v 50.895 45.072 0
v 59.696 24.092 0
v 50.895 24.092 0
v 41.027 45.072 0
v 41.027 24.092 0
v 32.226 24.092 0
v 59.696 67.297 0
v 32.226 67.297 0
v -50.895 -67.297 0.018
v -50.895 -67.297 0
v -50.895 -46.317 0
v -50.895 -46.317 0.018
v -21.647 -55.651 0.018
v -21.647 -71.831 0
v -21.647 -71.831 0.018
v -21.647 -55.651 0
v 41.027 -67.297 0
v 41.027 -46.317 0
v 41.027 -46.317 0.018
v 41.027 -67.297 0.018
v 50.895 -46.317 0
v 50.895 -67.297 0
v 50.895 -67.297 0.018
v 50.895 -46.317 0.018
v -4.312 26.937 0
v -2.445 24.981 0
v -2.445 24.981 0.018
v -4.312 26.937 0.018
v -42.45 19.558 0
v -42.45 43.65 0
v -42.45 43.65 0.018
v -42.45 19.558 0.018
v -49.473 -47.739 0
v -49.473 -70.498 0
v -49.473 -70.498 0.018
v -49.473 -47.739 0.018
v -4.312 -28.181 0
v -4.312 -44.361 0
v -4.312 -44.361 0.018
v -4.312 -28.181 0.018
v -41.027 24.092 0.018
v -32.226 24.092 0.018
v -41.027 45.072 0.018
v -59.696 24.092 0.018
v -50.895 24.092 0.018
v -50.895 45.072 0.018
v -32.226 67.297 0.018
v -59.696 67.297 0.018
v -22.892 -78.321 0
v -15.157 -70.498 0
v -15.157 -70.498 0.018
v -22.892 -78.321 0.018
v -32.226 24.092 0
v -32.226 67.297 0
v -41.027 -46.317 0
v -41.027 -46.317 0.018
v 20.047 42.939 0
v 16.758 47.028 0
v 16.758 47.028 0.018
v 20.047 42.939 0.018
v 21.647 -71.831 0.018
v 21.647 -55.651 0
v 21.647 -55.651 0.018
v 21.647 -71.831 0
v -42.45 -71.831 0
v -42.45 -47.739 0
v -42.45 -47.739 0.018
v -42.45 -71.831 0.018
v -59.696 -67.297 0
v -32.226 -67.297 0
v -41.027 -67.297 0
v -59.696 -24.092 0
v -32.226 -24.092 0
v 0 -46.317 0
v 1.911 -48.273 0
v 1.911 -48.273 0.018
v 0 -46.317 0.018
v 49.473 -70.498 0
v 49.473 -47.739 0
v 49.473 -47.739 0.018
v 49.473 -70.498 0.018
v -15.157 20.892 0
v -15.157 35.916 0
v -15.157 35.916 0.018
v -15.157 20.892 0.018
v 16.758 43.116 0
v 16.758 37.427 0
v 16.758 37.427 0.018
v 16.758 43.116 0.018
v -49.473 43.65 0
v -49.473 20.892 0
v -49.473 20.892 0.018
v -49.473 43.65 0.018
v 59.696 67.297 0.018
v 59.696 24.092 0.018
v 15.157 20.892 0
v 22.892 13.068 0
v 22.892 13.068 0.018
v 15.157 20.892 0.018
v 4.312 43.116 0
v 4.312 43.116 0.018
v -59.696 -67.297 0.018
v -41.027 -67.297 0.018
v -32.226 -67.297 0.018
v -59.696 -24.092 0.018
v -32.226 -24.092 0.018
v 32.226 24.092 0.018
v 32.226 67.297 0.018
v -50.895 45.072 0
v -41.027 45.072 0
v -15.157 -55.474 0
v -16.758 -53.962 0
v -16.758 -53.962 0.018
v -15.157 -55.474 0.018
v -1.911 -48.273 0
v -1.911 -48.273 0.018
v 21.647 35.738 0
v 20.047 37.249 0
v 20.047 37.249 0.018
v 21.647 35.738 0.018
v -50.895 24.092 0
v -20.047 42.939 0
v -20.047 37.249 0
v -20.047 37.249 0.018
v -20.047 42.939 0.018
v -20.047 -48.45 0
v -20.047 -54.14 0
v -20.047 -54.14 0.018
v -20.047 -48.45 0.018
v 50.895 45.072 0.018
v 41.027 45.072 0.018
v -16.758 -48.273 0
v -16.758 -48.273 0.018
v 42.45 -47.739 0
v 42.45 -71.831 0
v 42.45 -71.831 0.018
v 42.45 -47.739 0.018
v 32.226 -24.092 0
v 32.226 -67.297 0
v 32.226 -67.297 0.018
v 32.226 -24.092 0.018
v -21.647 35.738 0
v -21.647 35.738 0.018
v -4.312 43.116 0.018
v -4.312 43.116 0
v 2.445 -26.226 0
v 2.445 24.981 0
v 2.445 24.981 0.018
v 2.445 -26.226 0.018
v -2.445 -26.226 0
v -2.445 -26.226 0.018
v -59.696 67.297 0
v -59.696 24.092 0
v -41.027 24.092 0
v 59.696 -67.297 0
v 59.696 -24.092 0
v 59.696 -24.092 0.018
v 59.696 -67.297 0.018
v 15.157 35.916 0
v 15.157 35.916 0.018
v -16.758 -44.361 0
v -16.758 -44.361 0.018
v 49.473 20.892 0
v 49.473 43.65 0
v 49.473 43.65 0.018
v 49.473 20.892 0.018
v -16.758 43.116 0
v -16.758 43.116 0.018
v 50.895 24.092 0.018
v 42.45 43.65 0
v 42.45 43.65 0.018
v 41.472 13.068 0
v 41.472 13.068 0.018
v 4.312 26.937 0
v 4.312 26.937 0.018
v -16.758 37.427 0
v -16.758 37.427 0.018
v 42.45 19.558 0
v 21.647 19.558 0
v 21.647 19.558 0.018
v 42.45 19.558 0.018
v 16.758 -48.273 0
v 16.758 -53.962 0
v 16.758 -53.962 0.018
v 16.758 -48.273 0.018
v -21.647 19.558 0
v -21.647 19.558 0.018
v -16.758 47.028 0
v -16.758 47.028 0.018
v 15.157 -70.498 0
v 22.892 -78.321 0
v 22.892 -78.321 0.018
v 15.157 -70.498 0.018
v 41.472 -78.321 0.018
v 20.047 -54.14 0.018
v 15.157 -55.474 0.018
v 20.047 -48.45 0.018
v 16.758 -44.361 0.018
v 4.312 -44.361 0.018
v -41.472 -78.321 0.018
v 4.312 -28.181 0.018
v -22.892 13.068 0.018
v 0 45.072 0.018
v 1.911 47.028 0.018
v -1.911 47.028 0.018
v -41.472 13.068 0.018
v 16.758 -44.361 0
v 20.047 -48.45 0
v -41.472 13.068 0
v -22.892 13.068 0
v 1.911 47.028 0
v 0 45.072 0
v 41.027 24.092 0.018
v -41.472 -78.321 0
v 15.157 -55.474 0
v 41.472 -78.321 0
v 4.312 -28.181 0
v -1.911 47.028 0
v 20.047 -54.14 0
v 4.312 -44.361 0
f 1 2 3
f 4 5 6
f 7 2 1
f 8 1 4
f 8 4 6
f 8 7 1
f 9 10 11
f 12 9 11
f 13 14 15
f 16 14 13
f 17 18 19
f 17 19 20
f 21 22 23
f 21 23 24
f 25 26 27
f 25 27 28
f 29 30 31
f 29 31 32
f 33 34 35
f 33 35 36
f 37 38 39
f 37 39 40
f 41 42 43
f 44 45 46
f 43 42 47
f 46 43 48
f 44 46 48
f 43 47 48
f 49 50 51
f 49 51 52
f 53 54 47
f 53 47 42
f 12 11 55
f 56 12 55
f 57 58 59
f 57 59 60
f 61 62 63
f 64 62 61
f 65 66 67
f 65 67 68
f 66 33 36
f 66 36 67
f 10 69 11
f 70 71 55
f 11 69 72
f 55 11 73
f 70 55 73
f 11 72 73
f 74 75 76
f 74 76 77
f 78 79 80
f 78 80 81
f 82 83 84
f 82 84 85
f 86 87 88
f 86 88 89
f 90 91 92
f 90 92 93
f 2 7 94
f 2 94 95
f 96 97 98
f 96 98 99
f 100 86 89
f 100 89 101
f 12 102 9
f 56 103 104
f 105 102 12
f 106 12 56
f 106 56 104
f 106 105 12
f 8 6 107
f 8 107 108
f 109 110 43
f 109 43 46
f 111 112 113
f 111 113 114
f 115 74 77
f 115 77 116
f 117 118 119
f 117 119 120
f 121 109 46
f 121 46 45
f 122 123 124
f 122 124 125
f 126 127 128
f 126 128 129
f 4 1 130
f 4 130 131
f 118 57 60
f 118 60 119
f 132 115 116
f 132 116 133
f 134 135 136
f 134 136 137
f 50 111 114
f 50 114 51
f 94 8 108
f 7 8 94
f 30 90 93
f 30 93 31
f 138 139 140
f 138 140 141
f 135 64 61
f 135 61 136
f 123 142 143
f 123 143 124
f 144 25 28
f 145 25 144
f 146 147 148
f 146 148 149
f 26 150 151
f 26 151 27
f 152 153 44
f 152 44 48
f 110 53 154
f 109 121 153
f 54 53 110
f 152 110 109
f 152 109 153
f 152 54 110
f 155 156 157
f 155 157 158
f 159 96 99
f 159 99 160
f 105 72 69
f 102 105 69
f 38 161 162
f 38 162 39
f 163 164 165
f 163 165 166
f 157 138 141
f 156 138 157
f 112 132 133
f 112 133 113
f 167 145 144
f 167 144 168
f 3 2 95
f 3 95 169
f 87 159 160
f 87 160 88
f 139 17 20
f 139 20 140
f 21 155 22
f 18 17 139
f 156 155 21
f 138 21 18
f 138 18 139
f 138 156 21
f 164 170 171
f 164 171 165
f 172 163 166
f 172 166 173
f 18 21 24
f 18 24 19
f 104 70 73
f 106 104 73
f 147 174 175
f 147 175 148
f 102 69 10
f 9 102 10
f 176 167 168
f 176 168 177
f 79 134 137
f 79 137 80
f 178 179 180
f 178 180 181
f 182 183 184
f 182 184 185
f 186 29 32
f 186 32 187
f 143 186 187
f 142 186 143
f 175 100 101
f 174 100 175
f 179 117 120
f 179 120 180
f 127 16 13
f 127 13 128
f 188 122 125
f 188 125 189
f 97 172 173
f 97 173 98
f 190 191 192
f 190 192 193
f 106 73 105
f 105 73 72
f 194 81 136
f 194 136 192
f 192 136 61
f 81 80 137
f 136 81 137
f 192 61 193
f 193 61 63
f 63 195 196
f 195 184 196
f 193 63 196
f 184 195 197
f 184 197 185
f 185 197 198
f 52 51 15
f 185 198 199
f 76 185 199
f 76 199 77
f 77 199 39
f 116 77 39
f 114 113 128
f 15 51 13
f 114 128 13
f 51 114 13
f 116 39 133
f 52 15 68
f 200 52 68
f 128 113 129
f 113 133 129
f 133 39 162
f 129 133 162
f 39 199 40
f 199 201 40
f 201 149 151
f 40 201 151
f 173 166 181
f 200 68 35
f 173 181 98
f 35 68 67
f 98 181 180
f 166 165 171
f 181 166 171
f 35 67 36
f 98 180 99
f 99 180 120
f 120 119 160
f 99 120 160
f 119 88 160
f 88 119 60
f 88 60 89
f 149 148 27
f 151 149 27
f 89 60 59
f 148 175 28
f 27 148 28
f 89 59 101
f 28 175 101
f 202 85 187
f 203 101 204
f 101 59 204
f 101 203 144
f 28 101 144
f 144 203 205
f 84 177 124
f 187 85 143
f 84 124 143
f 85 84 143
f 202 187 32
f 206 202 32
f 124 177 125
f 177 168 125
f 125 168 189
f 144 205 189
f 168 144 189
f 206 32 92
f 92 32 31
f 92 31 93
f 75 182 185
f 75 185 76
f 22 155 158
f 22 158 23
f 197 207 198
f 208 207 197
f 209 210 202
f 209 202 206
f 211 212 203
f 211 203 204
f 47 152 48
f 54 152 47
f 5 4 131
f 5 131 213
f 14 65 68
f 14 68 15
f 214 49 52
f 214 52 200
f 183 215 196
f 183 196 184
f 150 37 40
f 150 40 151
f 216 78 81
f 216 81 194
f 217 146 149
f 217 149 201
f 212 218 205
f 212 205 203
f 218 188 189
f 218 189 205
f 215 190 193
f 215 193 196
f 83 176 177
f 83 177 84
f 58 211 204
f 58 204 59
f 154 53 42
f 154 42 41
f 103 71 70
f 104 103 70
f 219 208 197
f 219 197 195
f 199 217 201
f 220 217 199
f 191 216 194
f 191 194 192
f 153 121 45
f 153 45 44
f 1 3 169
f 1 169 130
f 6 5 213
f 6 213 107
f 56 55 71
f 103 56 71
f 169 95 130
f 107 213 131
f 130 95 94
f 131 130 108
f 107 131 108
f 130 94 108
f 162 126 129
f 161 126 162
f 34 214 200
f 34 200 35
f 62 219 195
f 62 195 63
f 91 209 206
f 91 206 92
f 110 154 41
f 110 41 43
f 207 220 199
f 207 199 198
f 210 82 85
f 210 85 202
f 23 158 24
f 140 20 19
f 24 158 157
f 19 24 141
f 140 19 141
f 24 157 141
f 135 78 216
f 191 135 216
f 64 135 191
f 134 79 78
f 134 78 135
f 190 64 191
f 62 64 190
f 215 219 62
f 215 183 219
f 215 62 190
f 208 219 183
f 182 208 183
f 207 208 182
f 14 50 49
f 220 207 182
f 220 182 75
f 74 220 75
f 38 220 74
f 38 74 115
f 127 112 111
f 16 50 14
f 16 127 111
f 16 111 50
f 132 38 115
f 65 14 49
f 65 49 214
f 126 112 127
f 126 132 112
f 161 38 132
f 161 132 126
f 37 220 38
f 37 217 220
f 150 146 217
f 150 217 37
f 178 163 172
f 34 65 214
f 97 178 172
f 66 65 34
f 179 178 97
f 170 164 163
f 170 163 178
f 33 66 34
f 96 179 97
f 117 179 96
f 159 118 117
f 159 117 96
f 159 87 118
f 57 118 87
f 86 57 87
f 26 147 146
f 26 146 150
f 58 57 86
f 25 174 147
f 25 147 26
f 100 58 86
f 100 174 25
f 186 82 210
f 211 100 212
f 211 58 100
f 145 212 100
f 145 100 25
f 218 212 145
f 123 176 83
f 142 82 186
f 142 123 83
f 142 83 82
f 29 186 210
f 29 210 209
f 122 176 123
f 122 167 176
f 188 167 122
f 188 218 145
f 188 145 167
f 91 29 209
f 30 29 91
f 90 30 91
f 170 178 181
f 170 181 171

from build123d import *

# Parameters (mm, degrees)
FEED_DEPTH    = 0.018
PATCH_DEPTH   = 0.018
PATCH_2_DEPTH = 0.018
PATCH_3_DEPTH = 0.018
PATCH_4_DEPTH = 0.018


with BuildPart() as part:
    # Feed1 → Feed (new body)
    with BuildSketch(Plane.XY):
        Polygon((-49.47285, 43.6499), (-42.44975, 43.6499), (-42.44975, 19.558), (-21.64715, 19.558), (-21.64715, 35.7378), (-20.04695, 37.2491), (-20.04695, 42.9387), (-16.75765, 47.0281), (-1.91135, 47.0281), (0, 45.0723), (1.91135, 47.0281), (16.75765, 47.0281), (20.04695, 42.9387), (20.04695, 37.2491), (21.64715, 35.7378), (21.64715, 19.558), (42.44975, 19.558), (42.44975, 43.6499), (49.47285, 43.6499), (49.47285, 20.8915), (41.47185, 13.0683), (22.89175, 13.0683), (15.15745, 20.8915), (15.15745, 35.9156), (16.75765, 37.4269), (16.75765, 43.1165), (4.31165, 43.1165), (4.31165, 26.9367), (2.44475, 24.9809), (2.44475, -26.2255), (4.31165, -28.1813), (4.31165, -44.3611), (16.75765, -44.3611), (20.04695, -48.4505), (20.04695, -54.1401), (21.64715, -55.6514), (21.64715, -71.8312), (42.44975, -71.8312), (42.44975, -47.7393), (49.47285, -47.7393), (49.47285, -70.4977), (41.47185, -78.3209), (22.89175, -78.3209), (15.15745, -70.4977), (15.15745, -55.4736), (16.75765, -53.9623), (16.75765, -48.2727), (1.91135, -48.2727), (0, -46.3169), (-1.91135, -48.2727), (-16.75765, -48.2727), (-16.75765, -53.9623), (-15.15745, -55.4736), (-15.15745, -70.4977), (-22.89175, -78.3209), (-41.47185, -78.3209), (-49.47285, -70.4977), (-49.47285, -47.7393), (-42.44975, -47.7393), (-42.44975, -71.8312), (-21.64715, -71.8312), (-21.64715, -55.6514), (-20.04695, -54.1401), (-20.04695, -48.4505), (-16.75765, -44.3611), (-4.31165, -44.3611), (-4.31165, -28.1813), (-2.44475, -26.2255), (-2.44475, 24.9809), (-4.31165, 26.9367), (-4.31165, 43.1165), (-16.75765, 43.1165), (-16.75765, 37.4269), (-15.15745, 35.9156), (-15.15745, 20.8915), (-22.89175, 13.0683), (-41.47185, 13.0683), (-49.47285, 20.8915), align=None)
    extrude(amount=FEED_DEPTH)


with BuildPart() as body_2:
    # Patch1 → Patch (new body)
    with BuildSketch(Plane.XY):
        Polygon((-59.69635, 67.2973), (-32.22625, 67.2973), (-32.22625, 24.0919), (-41.02735, 24.0919), (-41.02735, 45.0723), (-50.89525, 45.0723), (-50.89525, 24.0919), (-59.69635, 24.0919), align=None)
    extrude(amount=PATCH_DEPTH)


with BuildPart() as body_3:
    # Patch1 → Patch 2 (new body)
    with BuildSketch(Plane.XY):
        Polygon((41.02735, 24.0919), (32.22625, 24.0919), (32.22625, 67.2973), (59.69635, 67.2973), (59.69635, 24.0919), (50.89525, 24.0919), (50.89525, 45.0723), (41.02735, 45.0723), align=None)
    extrude(amount=PATCH_2_DEPTH)


with BuildPart() as body_4:
    # Patch1 → Patch 3 (new body)
    with BuildSketch(Plane.XY):
        Polygon((-41.02735, -67.2973), (-32.22625, -67.2973), (-32.22625, -24.0919), (-59.69635, -24.0919), (-59.69635, -67.2973), (-50.89525, -67.2973), (-50.89525, -46.3169), (-41.02735, -46.3169), align=None)
    extrude(amount=PATCH_3_DEPTH)


with BuildPart() as body_5:
    # Patch1 → Patch 4 (new body)
    with BuildSketch(Plane.XY):
        Polygon((59.69635, -67.2973), (50.89525, -67.2973), (50.89525, -46.3169), (41.02735, -46.3169), (41.02735, -67.2973), (32.22625, -67.2973), (32.22625, -24.0919), (59.69635, -24.0919), align=None)
    extrude(amount=PATCH_4_DEPTH)


solid = Compound([part.part, body_2.part, body_3.part, body_4.part, body_5.part])
